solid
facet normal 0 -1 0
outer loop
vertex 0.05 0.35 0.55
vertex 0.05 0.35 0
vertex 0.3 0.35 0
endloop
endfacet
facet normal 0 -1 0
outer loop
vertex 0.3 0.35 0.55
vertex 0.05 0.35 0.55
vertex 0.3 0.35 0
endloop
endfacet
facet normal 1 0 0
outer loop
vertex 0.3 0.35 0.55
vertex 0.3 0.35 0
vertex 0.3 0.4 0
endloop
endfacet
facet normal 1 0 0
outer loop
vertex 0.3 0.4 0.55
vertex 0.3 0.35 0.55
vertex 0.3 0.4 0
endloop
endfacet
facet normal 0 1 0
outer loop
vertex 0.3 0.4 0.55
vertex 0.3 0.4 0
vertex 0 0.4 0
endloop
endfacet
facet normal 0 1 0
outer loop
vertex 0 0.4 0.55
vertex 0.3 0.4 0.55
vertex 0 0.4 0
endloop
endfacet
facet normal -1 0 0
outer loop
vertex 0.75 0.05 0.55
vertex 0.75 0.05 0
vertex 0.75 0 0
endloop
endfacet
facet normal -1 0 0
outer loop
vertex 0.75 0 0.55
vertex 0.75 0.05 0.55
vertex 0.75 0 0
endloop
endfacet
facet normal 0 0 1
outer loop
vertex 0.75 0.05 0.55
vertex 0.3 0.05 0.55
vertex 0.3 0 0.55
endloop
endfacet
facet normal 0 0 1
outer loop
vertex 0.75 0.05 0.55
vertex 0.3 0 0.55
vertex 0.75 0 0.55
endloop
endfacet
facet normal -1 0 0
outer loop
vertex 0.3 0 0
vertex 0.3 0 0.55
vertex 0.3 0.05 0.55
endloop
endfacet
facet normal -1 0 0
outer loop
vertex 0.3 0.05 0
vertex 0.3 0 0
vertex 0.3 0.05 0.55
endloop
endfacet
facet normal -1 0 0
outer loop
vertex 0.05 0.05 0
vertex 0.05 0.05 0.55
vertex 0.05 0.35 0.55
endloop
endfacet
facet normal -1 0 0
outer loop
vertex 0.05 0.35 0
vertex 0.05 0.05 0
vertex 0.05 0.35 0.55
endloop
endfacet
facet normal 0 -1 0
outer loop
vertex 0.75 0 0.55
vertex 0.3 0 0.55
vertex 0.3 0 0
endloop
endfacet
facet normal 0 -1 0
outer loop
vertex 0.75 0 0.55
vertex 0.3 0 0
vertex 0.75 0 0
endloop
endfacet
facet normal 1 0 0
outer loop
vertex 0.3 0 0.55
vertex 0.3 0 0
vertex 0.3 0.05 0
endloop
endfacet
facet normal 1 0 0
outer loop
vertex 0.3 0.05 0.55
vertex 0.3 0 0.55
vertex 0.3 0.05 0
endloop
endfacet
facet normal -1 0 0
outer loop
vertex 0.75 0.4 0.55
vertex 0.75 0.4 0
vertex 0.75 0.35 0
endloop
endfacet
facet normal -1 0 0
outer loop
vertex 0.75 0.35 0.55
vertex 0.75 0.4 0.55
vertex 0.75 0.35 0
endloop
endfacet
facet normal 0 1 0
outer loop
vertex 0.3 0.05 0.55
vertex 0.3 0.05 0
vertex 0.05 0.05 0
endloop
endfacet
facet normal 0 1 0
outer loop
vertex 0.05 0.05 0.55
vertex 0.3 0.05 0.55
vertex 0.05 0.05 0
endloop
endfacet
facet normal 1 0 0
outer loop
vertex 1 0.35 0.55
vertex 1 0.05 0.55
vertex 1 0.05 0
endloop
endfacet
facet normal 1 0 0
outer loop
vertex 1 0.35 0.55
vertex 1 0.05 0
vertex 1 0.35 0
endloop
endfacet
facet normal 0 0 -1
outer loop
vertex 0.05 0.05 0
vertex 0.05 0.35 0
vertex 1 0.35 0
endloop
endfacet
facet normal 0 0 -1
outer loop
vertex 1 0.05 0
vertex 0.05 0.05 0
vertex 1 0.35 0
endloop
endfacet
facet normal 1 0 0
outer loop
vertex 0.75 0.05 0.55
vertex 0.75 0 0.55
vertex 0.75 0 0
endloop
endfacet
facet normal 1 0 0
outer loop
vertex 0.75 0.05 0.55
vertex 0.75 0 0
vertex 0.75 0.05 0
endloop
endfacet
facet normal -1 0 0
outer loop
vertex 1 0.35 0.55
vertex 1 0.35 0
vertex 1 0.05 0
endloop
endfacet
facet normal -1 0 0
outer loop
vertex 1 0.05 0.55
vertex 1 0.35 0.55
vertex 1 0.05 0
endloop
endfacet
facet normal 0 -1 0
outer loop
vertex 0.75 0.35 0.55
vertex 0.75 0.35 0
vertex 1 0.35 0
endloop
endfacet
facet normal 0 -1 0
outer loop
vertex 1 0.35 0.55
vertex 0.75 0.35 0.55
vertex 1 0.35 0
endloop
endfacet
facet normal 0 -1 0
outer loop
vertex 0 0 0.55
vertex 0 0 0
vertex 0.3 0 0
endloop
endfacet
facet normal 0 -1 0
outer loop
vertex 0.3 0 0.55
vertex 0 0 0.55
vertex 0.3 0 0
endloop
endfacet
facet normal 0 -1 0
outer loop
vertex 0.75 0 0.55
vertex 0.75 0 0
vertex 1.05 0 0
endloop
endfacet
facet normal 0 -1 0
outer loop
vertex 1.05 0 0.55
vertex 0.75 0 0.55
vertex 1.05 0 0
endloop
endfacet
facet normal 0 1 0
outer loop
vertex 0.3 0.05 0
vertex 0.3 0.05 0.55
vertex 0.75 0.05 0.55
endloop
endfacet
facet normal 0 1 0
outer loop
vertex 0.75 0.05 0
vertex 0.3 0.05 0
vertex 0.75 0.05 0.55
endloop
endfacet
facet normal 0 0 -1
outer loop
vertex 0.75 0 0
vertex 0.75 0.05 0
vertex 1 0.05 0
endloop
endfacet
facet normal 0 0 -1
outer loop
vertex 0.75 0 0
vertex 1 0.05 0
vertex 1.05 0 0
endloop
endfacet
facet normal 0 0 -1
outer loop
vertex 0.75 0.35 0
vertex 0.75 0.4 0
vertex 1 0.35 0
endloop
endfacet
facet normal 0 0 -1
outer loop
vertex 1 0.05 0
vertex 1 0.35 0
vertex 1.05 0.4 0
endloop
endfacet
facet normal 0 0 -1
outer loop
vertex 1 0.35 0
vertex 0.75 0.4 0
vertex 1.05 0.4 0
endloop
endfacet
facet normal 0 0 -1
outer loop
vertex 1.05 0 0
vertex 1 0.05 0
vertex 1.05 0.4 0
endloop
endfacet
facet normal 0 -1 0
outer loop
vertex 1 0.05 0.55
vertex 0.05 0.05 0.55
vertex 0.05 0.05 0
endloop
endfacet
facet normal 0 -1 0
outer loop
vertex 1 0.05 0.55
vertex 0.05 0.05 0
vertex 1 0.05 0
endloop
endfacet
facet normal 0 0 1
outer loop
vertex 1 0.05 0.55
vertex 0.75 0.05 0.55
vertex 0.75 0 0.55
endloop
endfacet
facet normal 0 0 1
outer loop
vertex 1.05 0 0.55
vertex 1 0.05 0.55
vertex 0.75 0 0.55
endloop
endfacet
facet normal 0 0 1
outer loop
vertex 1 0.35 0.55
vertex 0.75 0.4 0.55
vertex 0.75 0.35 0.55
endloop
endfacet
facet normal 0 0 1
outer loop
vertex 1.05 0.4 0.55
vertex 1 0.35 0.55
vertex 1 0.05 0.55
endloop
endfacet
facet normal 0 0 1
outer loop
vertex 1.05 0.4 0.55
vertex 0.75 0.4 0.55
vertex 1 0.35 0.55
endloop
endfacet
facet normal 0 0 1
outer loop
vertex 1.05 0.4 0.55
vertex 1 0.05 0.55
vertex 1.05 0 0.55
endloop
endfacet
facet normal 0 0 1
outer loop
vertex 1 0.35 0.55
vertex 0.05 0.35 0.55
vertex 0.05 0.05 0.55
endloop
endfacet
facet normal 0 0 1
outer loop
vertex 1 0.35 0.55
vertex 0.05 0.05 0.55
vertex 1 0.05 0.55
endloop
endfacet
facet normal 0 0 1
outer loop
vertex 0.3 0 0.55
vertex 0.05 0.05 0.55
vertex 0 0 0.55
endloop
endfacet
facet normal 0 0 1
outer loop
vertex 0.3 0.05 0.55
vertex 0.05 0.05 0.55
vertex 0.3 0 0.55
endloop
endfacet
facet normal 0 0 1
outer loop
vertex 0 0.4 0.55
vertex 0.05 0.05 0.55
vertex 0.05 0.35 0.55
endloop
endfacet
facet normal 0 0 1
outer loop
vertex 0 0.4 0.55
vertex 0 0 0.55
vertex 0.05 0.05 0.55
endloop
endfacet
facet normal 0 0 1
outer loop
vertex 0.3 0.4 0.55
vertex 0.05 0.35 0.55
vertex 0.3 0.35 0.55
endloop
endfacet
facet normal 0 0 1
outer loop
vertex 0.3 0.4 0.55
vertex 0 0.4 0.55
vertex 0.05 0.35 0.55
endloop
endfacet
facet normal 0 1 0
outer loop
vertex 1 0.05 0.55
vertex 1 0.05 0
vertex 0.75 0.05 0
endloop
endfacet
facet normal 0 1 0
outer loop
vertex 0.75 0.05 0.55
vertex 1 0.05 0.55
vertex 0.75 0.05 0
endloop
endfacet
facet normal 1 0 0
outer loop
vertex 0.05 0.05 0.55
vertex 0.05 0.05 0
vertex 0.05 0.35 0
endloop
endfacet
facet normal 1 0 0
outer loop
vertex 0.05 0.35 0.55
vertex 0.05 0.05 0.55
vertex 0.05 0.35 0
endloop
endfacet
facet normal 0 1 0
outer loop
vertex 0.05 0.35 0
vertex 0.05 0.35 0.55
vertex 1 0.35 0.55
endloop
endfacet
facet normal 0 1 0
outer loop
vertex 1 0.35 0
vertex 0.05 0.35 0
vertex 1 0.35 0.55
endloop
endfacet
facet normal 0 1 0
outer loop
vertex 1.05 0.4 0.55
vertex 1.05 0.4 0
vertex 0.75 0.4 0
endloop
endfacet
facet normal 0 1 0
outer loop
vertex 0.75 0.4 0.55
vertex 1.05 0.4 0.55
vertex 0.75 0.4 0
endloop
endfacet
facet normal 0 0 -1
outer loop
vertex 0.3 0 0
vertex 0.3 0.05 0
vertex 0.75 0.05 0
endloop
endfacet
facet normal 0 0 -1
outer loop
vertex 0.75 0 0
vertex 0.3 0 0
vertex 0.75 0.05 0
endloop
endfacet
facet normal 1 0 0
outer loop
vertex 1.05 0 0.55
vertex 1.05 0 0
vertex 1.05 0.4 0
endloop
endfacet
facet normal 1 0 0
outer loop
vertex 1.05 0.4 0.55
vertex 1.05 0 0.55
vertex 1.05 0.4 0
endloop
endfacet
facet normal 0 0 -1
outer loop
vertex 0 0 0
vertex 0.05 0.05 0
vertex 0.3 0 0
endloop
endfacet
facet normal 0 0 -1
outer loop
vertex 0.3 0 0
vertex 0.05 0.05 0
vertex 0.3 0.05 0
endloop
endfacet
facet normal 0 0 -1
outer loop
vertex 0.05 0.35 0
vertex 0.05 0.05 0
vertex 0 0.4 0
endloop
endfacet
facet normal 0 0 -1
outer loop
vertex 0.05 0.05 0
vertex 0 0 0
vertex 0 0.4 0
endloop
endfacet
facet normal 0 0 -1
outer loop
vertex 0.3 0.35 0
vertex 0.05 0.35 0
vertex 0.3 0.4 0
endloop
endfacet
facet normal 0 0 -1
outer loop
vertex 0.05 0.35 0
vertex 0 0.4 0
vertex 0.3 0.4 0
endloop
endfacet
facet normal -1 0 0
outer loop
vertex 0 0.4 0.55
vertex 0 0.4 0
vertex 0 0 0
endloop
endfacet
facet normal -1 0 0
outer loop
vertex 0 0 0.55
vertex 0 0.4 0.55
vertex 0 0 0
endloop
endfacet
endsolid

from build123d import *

# Parameters (mm, degrees)
DODANIE_WYCI_GNI_CIE1_DEPTH   = 0.55
DODANIE_WYCI_GNI_CIE1_2_DEPTH = 0.55
SZKIC2_W                      = 0.45
SZKIC2_H                      = 0.05
DODANIE_WYCI_GNI_CIE2_DEPTH   = 0.55
SZKIC3_W                      = 0.95
SZKIC3_H                      = 0.3
DODANIE_WYCI_GNI_CIE3_DEPTH   = 0.55


with BuildPart() as part:
    # Szkic1 → Dodanie-wyciągnięcie1 (new body)
    with BuildSketch(Plane.XY):
        Polygon((0.3, 0.05), (0.05, 0.05), (0.05, 0.35), (0.3, 0.35), (0.3, 0.4), (0, 0.4), (0, 0), (0.3, 0), align=None)
    extrude(amount=DODANIE_WYCI_GNI_CIE1_DEPTH)


with BuildPart() as body_2:
    # Szkic1 → Dodanie-wyci_gni_cie1 2 (new body)
    with BuildSketch(Plane.XY):
        Polygon((0.75, 0.35), (1, 0.35), (1, 0.05), (0.75, 0.05), (0.75, 0), (1.05, 0), (1.05, 0.4), (0.75, 0.4), align=None)
    extrude(amount=DODANIE_WYCI_GNI_CIE1_2_DEPTH)


with BuildPart() as body_3:
    # Szkic2 → Dodanie-wyciągnięcie2 (new body)
    with BuildSketch(Plane.XY.offset(0.55)):
        with Locations((0.525, 0.025)):
            Rectangle(SZKIC2_W, SZKIC2_H)
    extrude(amount=-DODANIE_WYCI_GNI_CIE2_DEPTH)


with BuildPart() as body_4:
    # Szkic3 → Dodanie-wyciągnięcie3 (new body)
    with BuildSketch(Plane.XY.offset(0.55)):
        with Locations((0.525, 0.2)):
            Rectangle(SZKIC3_W, SZKIC3_H)
    extrude(amount=-DODANIE_WYCI_GNI_CIE3_DEPTH)


solid = Compound([part.part, body_2.part, body_3.part, body_4.part])
